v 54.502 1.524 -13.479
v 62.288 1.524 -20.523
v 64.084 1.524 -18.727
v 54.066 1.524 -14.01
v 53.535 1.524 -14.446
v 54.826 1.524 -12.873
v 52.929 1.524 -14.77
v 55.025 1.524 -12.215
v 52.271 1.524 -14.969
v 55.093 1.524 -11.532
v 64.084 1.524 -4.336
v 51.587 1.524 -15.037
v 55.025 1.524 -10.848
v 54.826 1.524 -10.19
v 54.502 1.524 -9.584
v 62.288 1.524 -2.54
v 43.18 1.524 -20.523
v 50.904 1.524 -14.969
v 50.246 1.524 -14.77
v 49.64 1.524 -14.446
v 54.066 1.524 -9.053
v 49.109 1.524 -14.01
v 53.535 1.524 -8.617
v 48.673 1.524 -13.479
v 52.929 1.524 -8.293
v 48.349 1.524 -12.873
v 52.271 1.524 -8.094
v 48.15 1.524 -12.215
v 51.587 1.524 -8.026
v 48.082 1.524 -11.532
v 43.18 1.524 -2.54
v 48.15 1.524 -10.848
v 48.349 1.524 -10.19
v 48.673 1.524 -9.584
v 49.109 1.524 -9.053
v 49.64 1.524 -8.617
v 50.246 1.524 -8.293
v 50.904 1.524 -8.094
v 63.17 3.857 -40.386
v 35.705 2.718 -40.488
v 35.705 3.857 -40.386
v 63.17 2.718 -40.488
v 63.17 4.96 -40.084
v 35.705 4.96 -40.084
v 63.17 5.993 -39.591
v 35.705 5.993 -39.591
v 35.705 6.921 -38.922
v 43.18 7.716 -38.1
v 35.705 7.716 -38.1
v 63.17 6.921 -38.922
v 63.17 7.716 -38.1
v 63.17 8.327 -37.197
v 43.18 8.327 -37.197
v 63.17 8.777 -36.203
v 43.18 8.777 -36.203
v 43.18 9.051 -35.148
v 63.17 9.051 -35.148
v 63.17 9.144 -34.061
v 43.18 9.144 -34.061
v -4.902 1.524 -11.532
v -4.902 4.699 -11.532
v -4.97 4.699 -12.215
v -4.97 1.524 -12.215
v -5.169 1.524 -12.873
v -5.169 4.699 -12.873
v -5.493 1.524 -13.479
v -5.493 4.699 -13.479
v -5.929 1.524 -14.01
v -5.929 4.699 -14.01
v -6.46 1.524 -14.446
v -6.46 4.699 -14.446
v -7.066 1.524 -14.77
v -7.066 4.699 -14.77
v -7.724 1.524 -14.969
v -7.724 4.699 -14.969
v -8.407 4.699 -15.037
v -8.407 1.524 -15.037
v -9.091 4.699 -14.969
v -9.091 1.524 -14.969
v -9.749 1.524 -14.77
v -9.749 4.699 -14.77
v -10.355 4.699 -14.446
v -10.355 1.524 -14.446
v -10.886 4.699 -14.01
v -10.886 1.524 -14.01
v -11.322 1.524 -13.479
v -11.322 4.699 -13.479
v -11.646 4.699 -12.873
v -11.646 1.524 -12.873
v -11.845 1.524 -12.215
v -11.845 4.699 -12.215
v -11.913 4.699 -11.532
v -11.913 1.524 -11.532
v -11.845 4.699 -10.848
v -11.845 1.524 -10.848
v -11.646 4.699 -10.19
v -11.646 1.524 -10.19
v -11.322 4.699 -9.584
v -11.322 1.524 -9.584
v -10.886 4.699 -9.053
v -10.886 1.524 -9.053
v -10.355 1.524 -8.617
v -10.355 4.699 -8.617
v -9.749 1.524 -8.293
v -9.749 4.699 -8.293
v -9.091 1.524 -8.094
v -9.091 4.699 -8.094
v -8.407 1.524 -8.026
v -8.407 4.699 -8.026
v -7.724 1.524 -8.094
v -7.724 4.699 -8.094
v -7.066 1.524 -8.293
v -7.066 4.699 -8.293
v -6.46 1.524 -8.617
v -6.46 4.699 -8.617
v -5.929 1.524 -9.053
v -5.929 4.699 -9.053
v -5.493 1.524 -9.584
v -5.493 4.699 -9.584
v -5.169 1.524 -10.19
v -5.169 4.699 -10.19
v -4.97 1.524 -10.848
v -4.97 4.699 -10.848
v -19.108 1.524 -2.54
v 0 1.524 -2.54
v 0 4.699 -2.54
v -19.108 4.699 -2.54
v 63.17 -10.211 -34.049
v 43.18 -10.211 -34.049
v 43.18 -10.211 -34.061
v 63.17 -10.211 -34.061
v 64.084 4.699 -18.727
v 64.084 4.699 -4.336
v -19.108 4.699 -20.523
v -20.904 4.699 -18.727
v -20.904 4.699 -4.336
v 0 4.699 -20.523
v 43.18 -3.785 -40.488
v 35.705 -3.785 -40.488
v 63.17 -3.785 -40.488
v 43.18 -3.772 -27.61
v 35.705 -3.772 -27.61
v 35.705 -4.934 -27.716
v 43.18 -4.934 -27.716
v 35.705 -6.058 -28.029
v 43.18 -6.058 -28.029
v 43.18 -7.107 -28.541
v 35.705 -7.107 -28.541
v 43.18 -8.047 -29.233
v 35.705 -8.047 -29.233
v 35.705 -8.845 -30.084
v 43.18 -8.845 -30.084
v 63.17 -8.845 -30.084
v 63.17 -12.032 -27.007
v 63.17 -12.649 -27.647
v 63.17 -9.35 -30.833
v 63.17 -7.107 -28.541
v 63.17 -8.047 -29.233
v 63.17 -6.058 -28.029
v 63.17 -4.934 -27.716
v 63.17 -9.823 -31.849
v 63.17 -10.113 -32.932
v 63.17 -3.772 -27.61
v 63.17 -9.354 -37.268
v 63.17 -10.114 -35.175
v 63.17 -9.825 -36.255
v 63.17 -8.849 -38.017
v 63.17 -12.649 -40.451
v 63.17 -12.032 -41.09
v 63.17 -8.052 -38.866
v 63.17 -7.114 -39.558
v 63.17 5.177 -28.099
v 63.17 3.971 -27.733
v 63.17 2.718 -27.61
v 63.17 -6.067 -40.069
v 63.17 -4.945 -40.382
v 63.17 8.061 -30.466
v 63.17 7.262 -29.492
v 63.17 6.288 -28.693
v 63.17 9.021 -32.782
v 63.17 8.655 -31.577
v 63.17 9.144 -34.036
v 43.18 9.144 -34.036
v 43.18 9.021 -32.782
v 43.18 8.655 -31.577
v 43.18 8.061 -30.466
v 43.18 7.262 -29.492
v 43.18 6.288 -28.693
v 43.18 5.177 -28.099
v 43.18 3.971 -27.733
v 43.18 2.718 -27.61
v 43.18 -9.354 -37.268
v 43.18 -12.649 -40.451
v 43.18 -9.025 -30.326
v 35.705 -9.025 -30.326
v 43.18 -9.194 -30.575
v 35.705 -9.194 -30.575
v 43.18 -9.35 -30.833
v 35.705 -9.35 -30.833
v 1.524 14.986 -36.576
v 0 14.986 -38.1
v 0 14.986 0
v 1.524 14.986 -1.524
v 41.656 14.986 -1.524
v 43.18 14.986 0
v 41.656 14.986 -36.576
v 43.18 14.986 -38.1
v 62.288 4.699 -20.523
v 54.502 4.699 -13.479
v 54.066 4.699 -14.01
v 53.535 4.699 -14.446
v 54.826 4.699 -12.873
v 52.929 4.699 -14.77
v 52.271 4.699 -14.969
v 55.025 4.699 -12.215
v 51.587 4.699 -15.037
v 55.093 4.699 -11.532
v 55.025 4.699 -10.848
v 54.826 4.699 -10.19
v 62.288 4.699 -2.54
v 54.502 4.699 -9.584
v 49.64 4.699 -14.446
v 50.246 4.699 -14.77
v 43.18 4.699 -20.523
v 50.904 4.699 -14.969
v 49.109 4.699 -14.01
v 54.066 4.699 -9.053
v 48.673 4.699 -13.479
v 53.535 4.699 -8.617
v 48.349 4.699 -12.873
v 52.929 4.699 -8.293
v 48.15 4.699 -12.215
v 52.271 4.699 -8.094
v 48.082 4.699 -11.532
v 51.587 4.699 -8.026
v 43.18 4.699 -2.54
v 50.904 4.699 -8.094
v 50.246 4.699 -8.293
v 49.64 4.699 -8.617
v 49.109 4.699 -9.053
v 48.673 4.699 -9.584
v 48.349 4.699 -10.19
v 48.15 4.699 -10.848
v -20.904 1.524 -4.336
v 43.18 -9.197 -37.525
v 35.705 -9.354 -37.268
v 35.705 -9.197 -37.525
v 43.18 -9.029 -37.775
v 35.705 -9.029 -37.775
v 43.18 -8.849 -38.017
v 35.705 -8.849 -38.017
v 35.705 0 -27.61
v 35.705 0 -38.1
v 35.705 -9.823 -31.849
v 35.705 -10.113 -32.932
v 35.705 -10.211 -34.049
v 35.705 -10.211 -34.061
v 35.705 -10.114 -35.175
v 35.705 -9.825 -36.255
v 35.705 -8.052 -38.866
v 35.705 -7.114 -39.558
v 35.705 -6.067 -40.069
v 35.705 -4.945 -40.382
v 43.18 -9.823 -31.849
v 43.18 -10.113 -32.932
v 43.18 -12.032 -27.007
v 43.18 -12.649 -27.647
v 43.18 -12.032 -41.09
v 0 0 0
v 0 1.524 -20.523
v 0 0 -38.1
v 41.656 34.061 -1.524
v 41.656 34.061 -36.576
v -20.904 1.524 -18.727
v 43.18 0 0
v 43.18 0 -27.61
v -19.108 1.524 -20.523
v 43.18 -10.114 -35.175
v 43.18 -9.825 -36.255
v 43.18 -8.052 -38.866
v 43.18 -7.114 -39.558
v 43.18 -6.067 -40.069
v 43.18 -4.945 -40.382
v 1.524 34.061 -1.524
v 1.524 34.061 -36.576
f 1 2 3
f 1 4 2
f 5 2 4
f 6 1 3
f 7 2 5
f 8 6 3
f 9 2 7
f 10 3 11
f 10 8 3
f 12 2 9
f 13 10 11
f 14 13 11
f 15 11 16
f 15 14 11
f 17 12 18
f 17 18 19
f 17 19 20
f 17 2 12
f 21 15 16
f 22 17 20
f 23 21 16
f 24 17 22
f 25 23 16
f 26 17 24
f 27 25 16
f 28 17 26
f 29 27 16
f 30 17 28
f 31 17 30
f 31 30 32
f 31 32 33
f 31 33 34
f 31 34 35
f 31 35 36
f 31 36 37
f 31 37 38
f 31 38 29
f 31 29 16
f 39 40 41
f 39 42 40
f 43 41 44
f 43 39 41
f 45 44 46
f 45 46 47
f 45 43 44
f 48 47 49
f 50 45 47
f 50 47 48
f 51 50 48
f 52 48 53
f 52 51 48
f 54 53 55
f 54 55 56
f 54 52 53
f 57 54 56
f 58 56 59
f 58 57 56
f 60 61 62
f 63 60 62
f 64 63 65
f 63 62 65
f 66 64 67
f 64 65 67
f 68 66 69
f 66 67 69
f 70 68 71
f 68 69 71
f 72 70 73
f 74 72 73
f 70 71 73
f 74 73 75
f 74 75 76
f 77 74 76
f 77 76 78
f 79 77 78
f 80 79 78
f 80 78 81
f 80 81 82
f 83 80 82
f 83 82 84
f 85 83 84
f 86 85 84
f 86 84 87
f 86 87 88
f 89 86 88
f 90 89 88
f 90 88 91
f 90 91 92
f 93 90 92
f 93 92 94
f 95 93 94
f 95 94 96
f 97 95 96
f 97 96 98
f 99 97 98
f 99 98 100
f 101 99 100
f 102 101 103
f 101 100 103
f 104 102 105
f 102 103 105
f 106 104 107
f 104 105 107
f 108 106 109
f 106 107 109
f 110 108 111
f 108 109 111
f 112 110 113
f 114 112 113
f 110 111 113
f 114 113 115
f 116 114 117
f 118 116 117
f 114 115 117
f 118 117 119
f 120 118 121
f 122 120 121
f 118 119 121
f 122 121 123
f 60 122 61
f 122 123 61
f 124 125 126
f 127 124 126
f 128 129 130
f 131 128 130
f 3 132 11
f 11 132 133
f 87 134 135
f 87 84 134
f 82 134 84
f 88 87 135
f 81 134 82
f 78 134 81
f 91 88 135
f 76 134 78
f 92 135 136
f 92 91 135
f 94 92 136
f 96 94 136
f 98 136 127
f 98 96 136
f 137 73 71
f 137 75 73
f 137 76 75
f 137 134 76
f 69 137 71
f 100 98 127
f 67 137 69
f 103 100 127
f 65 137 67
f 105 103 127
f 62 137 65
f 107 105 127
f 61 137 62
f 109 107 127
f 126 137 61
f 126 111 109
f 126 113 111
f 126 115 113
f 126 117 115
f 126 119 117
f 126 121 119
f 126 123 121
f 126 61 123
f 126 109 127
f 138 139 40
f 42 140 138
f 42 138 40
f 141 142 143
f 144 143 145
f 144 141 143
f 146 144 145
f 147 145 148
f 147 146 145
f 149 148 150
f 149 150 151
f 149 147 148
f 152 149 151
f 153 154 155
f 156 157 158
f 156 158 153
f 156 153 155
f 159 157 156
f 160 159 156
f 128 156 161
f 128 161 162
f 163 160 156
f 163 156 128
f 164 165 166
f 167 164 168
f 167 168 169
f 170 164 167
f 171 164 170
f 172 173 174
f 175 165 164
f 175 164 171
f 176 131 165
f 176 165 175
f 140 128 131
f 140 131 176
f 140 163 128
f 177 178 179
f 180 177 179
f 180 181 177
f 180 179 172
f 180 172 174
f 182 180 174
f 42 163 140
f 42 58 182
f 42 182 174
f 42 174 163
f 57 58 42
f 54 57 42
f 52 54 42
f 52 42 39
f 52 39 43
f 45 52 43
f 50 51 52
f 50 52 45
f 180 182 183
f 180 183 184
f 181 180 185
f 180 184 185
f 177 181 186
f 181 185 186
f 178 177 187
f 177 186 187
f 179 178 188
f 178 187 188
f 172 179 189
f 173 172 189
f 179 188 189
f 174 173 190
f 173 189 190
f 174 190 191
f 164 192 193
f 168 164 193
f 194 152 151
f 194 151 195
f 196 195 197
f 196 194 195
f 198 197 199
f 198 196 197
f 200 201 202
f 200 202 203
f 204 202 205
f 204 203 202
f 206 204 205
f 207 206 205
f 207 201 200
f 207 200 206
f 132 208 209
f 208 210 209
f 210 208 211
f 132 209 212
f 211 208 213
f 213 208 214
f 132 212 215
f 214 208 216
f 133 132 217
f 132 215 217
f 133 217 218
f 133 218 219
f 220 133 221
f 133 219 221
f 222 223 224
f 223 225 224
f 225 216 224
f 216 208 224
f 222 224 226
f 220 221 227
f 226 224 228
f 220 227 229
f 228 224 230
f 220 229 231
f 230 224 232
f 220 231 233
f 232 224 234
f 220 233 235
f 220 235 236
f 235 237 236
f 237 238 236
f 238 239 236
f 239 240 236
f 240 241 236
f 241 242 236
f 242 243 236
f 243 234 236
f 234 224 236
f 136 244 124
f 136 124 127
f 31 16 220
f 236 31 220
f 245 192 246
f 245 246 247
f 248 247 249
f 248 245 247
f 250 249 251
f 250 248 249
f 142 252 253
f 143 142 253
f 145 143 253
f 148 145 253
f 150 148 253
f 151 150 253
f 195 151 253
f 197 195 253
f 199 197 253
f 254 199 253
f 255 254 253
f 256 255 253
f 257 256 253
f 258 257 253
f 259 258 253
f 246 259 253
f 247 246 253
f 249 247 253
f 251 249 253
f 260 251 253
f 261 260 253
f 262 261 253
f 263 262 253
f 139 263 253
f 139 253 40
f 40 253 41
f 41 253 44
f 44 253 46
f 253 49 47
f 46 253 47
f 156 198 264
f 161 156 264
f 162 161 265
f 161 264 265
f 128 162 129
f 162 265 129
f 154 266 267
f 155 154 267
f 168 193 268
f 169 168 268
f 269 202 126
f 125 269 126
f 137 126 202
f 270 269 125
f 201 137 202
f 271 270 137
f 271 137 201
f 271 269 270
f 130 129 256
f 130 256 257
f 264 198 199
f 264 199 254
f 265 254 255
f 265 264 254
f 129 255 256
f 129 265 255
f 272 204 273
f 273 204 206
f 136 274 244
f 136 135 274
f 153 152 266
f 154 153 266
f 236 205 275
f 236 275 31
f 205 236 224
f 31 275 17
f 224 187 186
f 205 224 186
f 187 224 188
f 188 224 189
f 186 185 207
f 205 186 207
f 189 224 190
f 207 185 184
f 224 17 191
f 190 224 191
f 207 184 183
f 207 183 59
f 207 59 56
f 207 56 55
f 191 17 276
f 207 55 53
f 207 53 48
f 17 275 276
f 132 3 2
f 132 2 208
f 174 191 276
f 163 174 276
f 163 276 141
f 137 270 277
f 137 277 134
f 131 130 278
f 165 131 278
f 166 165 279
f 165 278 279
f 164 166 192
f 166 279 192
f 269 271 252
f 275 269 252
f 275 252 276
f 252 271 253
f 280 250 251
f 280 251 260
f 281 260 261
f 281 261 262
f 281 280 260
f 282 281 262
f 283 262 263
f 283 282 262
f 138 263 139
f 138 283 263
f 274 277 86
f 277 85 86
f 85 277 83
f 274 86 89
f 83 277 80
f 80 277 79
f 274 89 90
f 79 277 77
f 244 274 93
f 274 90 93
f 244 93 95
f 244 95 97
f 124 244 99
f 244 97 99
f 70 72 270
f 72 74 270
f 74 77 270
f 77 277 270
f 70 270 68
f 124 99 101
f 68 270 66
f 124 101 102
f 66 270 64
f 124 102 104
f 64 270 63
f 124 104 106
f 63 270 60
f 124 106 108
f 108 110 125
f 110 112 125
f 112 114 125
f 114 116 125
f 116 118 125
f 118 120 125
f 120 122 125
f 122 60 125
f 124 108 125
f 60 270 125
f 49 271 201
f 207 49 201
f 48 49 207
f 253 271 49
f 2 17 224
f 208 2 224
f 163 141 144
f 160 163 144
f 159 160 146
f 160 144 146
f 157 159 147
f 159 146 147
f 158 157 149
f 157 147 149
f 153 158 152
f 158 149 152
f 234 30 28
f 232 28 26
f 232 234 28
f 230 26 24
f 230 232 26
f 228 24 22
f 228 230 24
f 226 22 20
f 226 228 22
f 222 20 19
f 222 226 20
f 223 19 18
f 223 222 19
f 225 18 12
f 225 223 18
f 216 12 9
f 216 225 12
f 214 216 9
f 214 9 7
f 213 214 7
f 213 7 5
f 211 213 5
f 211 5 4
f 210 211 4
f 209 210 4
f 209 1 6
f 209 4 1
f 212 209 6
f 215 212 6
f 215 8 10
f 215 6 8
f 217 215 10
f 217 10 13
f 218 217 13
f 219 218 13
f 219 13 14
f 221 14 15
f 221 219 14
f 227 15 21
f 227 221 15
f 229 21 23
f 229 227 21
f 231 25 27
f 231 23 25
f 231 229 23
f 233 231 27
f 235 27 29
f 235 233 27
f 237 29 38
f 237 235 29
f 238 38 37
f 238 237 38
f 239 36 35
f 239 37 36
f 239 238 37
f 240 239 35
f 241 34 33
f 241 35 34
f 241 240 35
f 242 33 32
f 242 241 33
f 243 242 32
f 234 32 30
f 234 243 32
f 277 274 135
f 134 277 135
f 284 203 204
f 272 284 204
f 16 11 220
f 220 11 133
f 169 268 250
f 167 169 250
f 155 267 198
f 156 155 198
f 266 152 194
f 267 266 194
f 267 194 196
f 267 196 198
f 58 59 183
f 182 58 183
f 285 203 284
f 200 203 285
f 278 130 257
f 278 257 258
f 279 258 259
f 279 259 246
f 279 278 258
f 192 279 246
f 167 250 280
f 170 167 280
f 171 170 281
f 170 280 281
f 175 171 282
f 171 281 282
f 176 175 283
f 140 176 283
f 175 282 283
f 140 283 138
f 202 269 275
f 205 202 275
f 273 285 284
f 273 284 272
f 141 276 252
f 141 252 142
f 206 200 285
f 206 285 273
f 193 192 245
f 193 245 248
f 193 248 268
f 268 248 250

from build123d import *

# Parameters (mm, degrees)
SKETCH1_W                = 43.18
SKETCH1_H                = 38.1
BOSS_EXTRUDE1_DEPTH      = 14.986
SKETCH3_W                = 40.132
SKETCH3_H                = 35.052
BOSS_EXTRUDE2_DEPTH      = 19.0754
SKETCH4_W                = 17.9832
SKETCH4_H                = 3.175
BOSS_EXTRUDE3_DEPTH      = 20.9042
SKETCH6_R                = 3.5052
CUT_EXTRUDE2_DEPTH       = 5.699
CHAMFER1_SIZE            = 1.79578
CHAMFER2_SIZE            = 1.79578
BOSS_EXTRUDE4_DEPTH      = 19.9898
BOSS_EXTRUDE4_DEPTH_BACK = 7.47522
BOSS_EXTRUDE5_DEPTH      = 19.9898


with BuildPart() as part:
    # Sketch1 → Boss-Extrude1 (new body)
    with BuildSketch(Plane(origin=(0, 0, 0), x_dir=(1, 0, 0), z_dir=(0, 1, 0))):
        with Locations((21.59, 19.05)):
            Rectangle(SKETCH1_W, SKETCH1_H)
    extrude(amount=BOSS_EXTRUDE1_DEPTH)

    # Sketch3 → Boss-Extrude2 (add)
    with BuildSketch(Plane(origin=(0, 14.986, 0), x_dir=(1, 0, 0), z_dir=(0, 1, 0))):
        with Locations((21.59, 19.05)):
            Rectangle(SKETCH3_W, SKETCH3_H)
    extrude(amount=BOSS_EXTRUDE2_DEPTH)

    # Sketch4 → Boss-Extrude3 (add)
    with BuildSketch(Plane.ZY):
        with Locations((-11.5316, 3.1115)):
            Rectangle(SKETCH4_W, SKETCH4_H)
    boss_extrude3 = extrude(amount=BOSS_EXTRUDE3_DEPTH)

    # Mirror1: Boss-Extrude3 across plane
    add(boss_extrude3.mirror(Plane(origin=(21.59, 0, 0), x_dir=(0, 0, 1), z_dir=(1, 0, 0))))

    # Sketch6 → Cut-Extrude2 (cut, through all)
    with BuildSketch(Plane(origin=(0, 4.699, 0), x_dir=(1, 0, 0), z_dir=(0, 1, 0))):
        with Locations((-8.4074, 11.5316)):
            Circle(SKETCH6_R)
    cut_extrude2 = extrude(amount=-CUT_EXTRUDE2_DEPTH, mode=Mode.SUBTRACT)

    # Mirror3: Cut-Extrude2 across plane
    add(cut_extrude2.mirror(Plane(origin=(21.59, 0, 0), x_dir=(0, 0, 1), z_dir=(1, 0, 0))), mode=Mode.SUBTRACT)

    # Chamfer1
    chamfer1_edges = [part.edges().sort_by_distance(p)[0] for p in [
        (64.0842, 3.1115, -20.5232),
        (64.0842, 3.1115, -2.54),
    ]]
    chamfer(chamfer1_edges, length=CHAMFER1_SIZE)

    # Chamfer2
    chamfer2_edges = [part.edges().sort_by_distance(p)[0] for p in [
        (-20.9042, 3.1115, -20.5232),
        (-20.9042, 3.1115, -2.54),
    ]]
    chamfer(chamfer2_edges, length=CHAMFER2_SIZE)

    # Sketch7 → Boss-Extrude4 (add, two sides)
    with BuildSketch(Plane(origin=(43.18, 0, 0), x_dir=(0, 0, -1), z_dir=(1, 0, 0))) as boss_extrude4_sk:
        with BuildLine():
            Line((34.0614, 9.144), (34.036, 9.144))
            ThreePointArc((34.036, 9.144), (29.491990403, 7.261809597), (27.6098, 2.7178))
            Line((27.6098, 2.7178), (27.6098, 0))
            Line((27.6098, 0), (38.1, 0))
            Line((38.1, 0), (38.1, 7.716375445))
            ThreePointArc((38.1, 7.716375445), (36.203151726, 8.776590802), (34.0614, 9.144))
        make_face()
        with BuildLine():
            ThreePointArc((40.4876, 2.7178), (39.860059231, 5.487564893), (38.1, 7.716375445))
            Line((38.1, 7.716375445), (38.1, 0))
            Line((38.1, 0), (27.6098, 0))
            Line((27.6098, 0), (27.6098, -3.7719))
            ThreePointArc((27.6098, -3.7719), (28.261339144, -6.594290394), (30.084100746, -8.845496946))
            Line((30.084100746, -8.845496946), (34.0487, -4.740034236))
            Line((34.0487, -4.740034236), (38.016880079, -8.849204998))
            ThreePointArc((38.016880079, -8.849204998), (39.836984495, -6.602164583), (40.4876, -3.7846))
            Line((40.4876, -3.7846), (40.4876, 2.7178))
        make_face()
        with BuildLine():
            Line((34.0487, -6.0198), (30.832652906, -9.350114257))
            ThreePointArc((30.832652906, -9.350114257), (32.384087518, -9.991907918), (34.0487, -10.2108))
            Line((34.0487, -10.2108), (34.0487, -6.0198))
        make_face()
        with BuildLine():
            ThreePointArc((34.0614, -10.2108), (35.721039602, -9.992791591), (37.268072877, -9.353558206))
            Line((37.268072877, -9.353558206), (34.0487, -6.0198))
            Line((34.0487, -6.0198), (34.0487, -10.2108))
            Line((34.0487, -10.2108), (34.0614, -10.2108))
        make_face()
        with BuildLine():
            Line((34.0487, -4.740034236), (30.084100746, -8.845496946))
            ThreePointArc((30.084100746, -8.845496946), (30.449522295, -9.110940462), (30.832652906, -9.350114257))
            Line((30.832652906, -9.350114257), (34.0487, -6.0198))
            Line((34.0487, -6.0198), (37.268072877, -9.353558206))
            ThreePointArc((37.268072877, -9.353558206), (37.651344537, -9.114547904), (38.016880079, -8.849204998))
            Line((38.016880079, -8.849204998), (34.0487, -4.740034236))
        make_face()
    extrude(amount=BOSS_EXTRUDE4_DEPTH)
    extrude(boss_extrude4_sk.sketch, amount=-BOSS_EXTRUDE4_DEPTH_BACK)

    # Sketch7_3 → Boss-Extrude5 (add)
    with BuildSketch(Plane(origin=(43.18, 0, 0), x_dir=(0, 0, -1), z_dir=(1, 0, 0))):
        Polygon((34.0487, -4.740034236), (27.007269754, -12.031648709), (27.646762836, -12.6492), (34.0487, -6.0198), (40.450637164, -12.6492), (41.090130246, -12.031648709), align=None)
    extrude(amount=BOSS_EXTRUDE5_DEPTH)


solid = part.part
